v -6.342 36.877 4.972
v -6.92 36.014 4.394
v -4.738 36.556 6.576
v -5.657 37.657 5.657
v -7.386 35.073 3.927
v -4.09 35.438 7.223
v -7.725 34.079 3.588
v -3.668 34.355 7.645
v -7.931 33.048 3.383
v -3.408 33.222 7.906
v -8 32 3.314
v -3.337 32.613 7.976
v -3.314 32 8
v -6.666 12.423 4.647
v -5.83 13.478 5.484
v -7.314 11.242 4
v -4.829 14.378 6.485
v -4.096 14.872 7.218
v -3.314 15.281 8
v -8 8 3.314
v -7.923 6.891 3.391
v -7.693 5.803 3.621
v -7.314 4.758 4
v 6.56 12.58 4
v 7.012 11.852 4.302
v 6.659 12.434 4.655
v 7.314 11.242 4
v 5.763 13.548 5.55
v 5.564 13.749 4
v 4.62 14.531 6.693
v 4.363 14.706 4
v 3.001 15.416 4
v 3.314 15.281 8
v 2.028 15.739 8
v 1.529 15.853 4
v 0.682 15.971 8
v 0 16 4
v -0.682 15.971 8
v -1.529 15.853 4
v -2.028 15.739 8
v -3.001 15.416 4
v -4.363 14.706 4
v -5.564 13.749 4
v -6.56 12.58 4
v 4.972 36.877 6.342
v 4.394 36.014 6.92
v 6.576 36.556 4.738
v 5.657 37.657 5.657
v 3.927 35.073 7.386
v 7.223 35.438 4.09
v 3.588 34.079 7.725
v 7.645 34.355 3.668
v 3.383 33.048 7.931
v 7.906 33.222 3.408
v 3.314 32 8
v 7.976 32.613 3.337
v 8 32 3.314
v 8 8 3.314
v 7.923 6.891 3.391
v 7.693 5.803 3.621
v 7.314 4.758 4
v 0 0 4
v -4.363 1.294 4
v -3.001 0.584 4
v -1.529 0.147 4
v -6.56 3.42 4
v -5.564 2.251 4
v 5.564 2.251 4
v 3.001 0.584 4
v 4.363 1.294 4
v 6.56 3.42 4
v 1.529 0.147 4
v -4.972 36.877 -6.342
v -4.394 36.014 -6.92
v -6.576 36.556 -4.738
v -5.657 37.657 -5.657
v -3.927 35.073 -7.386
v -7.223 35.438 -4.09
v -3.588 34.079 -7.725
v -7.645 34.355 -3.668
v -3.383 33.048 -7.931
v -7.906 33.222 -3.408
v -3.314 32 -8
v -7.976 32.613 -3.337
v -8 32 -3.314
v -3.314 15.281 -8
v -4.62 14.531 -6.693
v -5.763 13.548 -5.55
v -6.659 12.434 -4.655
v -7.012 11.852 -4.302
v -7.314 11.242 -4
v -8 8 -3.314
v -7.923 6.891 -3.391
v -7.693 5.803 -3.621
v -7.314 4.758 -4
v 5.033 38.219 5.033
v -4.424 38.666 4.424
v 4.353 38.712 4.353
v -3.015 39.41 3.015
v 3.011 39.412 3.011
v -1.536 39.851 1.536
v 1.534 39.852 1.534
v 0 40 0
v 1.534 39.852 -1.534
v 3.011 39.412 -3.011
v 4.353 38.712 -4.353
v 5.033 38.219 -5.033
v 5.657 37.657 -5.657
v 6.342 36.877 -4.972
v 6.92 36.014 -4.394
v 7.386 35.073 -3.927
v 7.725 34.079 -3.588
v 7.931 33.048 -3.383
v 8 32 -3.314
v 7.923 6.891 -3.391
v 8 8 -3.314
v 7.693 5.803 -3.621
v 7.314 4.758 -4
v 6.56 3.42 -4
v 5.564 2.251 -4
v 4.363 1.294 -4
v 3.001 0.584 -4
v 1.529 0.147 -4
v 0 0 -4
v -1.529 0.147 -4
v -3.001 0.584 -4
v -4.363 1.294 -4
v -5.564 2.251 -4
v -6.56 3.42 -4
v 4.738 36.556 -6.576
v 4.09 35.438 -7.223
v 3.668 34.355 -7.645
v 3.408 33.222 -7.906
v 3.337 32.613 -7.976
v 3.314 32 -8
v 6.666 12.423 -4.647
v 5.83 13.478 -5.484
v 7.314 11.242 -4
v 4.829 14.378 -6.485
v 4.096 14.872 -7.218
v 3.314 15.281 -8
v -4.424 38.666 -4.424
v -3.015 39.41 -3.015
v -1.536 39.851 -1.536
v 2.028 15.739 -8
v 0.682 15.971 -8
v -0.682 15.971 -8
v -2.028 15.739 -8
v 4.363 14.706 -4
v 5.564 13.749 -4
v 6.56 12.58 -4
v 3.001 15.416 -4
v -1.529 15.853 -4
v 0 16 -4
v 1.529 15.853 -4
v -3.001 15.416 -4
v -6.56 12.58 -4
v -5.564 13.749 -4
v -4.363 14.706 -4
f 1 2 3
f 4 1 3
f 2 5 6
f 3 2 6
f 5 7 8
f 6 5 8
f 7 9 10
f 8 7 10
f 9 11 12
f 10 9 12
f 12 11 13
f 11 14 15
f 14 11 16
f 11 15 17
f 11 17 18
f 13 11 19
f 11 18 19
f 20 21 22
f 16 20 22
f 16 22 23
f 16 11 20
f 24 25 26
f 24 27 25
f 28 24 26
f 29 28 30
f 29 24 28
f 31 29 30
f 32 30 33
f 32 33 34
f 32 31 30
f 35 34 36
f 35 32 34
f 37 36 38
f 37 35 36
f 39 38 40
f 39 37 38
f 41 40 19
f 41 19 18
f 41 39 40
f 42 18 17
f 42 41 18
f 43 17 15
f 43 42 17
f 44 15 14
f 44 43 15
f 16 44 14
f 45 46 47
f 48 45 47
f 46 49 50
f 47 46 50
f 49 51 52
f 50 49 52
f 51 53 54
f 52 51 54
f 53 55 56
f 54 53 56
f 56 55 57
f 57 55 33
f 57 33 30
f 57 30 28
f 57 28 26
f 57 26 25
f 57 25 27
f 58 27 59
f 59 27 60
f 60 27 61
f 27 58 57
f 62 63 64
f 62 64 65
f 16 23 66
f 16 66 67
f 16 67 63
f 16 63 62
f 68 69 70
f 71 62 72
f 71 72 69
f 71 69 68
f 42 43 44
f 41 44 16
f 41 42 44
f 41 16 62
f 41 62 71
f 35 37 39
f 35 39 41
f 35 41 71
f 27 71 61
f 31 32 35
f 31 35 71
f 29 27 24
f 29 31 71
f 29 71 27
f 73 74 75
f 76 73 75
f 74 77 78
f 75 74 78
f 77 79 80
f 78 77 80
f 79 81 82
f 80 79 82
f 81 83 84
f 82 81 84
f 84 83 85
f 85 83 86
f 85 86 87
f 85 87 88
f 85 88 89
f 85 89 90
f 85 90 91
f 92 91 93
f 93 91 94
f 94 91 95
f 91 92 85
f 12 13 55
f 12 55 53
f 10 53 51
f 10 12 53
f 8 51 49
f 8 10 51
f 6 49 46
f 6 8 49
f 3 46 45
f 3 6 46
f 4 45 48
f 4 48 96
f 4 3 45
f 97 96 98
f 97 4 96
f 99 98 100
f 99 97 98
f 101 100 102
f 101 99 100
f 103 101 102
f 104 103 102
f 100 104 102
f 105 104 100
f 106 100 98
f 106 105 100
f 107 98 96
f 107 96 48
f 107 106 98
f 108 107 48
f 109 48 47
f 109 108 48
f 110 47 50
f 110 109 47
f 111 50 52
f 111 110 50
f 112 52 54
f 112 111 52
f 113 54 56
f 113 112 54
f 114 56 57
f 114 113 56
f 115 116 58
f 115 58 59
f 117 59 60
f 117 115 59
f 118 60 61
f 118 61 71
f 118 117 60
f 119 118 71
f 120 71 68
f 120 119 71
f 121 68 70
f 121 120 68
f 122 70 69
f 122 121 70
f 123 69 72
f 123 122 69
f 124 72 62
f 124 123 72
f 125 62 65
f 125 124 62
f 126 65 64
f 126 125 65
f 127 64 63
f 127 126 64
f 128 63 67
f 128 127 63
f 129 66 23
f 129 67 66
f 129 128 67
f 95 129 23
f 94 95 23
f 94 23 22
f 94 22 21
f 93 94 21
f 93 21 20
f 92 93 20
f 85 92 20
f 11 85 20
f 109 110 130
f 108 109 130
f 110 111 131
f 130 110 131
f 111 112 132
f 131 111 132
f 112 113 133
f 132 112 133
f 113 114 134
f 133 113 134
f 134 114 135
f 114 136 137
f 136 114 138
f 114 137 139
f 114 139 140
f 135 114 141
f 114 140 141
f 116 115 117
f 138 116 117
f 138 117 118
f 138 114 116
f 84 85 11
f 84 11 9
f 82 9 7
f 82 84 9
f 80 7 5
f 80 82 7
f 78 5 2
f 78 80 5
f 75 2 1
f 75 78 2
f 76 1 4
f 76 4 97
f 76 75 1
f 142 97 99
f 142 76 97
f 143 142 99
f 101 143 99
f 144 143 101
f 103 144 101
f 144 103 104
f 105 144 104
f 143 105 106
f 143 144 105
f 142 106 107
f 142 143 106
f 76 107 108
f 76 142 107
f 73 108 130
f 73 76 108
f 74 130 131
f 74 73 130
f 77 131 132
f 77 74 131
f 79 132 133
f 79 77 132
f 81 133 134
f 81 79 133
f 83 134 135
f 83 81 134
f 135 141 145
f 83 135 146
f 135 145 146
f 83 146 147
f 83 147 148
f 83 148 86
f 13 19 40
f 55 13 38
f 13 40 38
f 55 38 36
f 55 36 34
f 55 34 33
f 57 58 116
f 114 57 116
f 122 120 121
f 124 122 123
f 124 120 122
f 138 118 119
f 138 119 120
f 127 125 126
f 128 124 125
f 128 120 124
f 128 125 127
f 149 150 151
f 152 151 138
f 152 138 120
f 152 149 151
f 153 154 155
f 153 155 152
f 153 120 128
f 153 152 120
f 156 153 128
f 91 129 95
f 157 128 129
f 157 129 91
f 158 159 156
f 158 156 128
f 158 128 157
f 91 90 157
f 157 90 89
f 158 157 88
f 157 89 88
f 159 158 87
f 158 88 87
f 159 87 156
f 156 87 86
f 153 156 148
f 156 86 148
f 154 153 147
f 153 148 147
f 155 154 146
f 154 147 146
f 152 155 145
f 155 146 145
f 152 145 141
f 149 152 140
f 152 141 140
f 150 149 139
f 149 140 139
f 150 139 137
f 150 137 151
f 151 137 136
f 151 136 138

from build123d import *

# Parameters (mm, degrees)
EXTRUDE_1_DEPTH          = 40
CUT_EXTRUDE_1_DEPTH      = 42.569219382
CUT_EXTRUDE_1_DEPTH_BACK = 42.569219382
CUT_EXTRUDE_START        = -4
SKETCH_5_R               = 8
CUT_EXTRUDE_2_DEPTH      = 4
SKETCH_6_R               = 8
CUT_EXTRUDE_3_DEPTH      = 4
CUT_EXTRUDE_4_DEPTH      = 100
CUT_EXTRUDE_5_DEPTH      = 100


with BuildPart() as part:
    # 草图2 → 凸台-拉伸1 (new body)
    with BuildSketch(Plane(origin=(0, 0, 0), x_dir=(1, 0, 0), z_dir=(0, 1, 0))):
        Polygon((8, 3.313708499), (3.313708499, 8), (-3.313708499, 8), (-8, 3.313708499), (-8, -3.313708499), (-3.313708499, -8), (3.313708499, -8), (8, -3.313708499), align=None)
    extrude(amount=EXTRUDE_1_DEPTH)

    # 草图4 → 切除-拉伸1 (cut, two sides: drawn at the far end of the back side and taken through both)
    with BuildSketch(Plane.XY.offset(-CUT_EXTRUDE_1_DEPTH_BACK)):
        with BuildLine():
            Line((-8, 8), (-8, -3.683086278))
            Line((-8, -3.683086278), (8, -3.683086278))
            Line((8, -3.683086278), (8, 8))
            ThreePointArc((8, 8), (0, 0), (-8, 8))
        make_face()
    extrude(amount=CUT_EXTRUDE_1_DEPTH + CUT_EXTRUDE_1_DEPTH_BACK, mode=Mode.SUBTRACT)

    # 草图5 → 切除-拉伸2 (cut)
    with BuildSketch(Plane.XY.offset(8).offset(CUT_EXTRUDE_START)):
        with Locations((0, 8)):
            Circle(SKETCH_5_R)
    extrude(amount=CUT_EXTRUDE_2_DEPTH, mode=Mode.SUBTRACT)

    # 草图6 → 切除-拉伸3 (cut)
    with BuildSketch(Plane(origin=(0, 0, -8), x_dir=(-1, 0, 0), z_dir=(0, 0, -1))):
        with Locations((0, 8)):
            Circle(SKETCH_6_R)
    extrude(amount=-CUT_EXTRUDE_3_DEPTH, mode=Mode.SUBTRACT)

    # 草图7 → 切除-拉伸4 (cut)
    with BuildSketch(Plane(origin=(0, 0, -8), x_dir=(-1, 0, 0), z_dir=(0, 0, -1))):
        with BuildLine():
            Line((-8, 32), (-8, 48.980650176))
            Line((-8, 48.980650176), (8, 48.980650176))
            Line((8, 48.980650176), (8, 32))
            ThreePointArc((8, 32), (0, 40), (-8, 32))
        make_face()
    extrude(amount=-CUT_EXTRUDE_4_DEPTH, mode=Mode.SUBTRACT)

    # 草图8 → 切除-拉伸5 (cut)
    with BuildSketch(Plane.ZY.offset(8)):
        with BuildLine():
            Line((-8, 32), (-8, 42.16921849))
            Line((-8, 42.16921849), (8, 42.16921849))
            Line((8, 42.16921849), (8, 32))
            ThreePointArc((8, 32), (0, 40), (-8, 32))
        make_face()
    extrude(amount=-CUT_EXTRUDE_5_DEPTH, mode=Mode.SUBTRACT)


solid = part.part
